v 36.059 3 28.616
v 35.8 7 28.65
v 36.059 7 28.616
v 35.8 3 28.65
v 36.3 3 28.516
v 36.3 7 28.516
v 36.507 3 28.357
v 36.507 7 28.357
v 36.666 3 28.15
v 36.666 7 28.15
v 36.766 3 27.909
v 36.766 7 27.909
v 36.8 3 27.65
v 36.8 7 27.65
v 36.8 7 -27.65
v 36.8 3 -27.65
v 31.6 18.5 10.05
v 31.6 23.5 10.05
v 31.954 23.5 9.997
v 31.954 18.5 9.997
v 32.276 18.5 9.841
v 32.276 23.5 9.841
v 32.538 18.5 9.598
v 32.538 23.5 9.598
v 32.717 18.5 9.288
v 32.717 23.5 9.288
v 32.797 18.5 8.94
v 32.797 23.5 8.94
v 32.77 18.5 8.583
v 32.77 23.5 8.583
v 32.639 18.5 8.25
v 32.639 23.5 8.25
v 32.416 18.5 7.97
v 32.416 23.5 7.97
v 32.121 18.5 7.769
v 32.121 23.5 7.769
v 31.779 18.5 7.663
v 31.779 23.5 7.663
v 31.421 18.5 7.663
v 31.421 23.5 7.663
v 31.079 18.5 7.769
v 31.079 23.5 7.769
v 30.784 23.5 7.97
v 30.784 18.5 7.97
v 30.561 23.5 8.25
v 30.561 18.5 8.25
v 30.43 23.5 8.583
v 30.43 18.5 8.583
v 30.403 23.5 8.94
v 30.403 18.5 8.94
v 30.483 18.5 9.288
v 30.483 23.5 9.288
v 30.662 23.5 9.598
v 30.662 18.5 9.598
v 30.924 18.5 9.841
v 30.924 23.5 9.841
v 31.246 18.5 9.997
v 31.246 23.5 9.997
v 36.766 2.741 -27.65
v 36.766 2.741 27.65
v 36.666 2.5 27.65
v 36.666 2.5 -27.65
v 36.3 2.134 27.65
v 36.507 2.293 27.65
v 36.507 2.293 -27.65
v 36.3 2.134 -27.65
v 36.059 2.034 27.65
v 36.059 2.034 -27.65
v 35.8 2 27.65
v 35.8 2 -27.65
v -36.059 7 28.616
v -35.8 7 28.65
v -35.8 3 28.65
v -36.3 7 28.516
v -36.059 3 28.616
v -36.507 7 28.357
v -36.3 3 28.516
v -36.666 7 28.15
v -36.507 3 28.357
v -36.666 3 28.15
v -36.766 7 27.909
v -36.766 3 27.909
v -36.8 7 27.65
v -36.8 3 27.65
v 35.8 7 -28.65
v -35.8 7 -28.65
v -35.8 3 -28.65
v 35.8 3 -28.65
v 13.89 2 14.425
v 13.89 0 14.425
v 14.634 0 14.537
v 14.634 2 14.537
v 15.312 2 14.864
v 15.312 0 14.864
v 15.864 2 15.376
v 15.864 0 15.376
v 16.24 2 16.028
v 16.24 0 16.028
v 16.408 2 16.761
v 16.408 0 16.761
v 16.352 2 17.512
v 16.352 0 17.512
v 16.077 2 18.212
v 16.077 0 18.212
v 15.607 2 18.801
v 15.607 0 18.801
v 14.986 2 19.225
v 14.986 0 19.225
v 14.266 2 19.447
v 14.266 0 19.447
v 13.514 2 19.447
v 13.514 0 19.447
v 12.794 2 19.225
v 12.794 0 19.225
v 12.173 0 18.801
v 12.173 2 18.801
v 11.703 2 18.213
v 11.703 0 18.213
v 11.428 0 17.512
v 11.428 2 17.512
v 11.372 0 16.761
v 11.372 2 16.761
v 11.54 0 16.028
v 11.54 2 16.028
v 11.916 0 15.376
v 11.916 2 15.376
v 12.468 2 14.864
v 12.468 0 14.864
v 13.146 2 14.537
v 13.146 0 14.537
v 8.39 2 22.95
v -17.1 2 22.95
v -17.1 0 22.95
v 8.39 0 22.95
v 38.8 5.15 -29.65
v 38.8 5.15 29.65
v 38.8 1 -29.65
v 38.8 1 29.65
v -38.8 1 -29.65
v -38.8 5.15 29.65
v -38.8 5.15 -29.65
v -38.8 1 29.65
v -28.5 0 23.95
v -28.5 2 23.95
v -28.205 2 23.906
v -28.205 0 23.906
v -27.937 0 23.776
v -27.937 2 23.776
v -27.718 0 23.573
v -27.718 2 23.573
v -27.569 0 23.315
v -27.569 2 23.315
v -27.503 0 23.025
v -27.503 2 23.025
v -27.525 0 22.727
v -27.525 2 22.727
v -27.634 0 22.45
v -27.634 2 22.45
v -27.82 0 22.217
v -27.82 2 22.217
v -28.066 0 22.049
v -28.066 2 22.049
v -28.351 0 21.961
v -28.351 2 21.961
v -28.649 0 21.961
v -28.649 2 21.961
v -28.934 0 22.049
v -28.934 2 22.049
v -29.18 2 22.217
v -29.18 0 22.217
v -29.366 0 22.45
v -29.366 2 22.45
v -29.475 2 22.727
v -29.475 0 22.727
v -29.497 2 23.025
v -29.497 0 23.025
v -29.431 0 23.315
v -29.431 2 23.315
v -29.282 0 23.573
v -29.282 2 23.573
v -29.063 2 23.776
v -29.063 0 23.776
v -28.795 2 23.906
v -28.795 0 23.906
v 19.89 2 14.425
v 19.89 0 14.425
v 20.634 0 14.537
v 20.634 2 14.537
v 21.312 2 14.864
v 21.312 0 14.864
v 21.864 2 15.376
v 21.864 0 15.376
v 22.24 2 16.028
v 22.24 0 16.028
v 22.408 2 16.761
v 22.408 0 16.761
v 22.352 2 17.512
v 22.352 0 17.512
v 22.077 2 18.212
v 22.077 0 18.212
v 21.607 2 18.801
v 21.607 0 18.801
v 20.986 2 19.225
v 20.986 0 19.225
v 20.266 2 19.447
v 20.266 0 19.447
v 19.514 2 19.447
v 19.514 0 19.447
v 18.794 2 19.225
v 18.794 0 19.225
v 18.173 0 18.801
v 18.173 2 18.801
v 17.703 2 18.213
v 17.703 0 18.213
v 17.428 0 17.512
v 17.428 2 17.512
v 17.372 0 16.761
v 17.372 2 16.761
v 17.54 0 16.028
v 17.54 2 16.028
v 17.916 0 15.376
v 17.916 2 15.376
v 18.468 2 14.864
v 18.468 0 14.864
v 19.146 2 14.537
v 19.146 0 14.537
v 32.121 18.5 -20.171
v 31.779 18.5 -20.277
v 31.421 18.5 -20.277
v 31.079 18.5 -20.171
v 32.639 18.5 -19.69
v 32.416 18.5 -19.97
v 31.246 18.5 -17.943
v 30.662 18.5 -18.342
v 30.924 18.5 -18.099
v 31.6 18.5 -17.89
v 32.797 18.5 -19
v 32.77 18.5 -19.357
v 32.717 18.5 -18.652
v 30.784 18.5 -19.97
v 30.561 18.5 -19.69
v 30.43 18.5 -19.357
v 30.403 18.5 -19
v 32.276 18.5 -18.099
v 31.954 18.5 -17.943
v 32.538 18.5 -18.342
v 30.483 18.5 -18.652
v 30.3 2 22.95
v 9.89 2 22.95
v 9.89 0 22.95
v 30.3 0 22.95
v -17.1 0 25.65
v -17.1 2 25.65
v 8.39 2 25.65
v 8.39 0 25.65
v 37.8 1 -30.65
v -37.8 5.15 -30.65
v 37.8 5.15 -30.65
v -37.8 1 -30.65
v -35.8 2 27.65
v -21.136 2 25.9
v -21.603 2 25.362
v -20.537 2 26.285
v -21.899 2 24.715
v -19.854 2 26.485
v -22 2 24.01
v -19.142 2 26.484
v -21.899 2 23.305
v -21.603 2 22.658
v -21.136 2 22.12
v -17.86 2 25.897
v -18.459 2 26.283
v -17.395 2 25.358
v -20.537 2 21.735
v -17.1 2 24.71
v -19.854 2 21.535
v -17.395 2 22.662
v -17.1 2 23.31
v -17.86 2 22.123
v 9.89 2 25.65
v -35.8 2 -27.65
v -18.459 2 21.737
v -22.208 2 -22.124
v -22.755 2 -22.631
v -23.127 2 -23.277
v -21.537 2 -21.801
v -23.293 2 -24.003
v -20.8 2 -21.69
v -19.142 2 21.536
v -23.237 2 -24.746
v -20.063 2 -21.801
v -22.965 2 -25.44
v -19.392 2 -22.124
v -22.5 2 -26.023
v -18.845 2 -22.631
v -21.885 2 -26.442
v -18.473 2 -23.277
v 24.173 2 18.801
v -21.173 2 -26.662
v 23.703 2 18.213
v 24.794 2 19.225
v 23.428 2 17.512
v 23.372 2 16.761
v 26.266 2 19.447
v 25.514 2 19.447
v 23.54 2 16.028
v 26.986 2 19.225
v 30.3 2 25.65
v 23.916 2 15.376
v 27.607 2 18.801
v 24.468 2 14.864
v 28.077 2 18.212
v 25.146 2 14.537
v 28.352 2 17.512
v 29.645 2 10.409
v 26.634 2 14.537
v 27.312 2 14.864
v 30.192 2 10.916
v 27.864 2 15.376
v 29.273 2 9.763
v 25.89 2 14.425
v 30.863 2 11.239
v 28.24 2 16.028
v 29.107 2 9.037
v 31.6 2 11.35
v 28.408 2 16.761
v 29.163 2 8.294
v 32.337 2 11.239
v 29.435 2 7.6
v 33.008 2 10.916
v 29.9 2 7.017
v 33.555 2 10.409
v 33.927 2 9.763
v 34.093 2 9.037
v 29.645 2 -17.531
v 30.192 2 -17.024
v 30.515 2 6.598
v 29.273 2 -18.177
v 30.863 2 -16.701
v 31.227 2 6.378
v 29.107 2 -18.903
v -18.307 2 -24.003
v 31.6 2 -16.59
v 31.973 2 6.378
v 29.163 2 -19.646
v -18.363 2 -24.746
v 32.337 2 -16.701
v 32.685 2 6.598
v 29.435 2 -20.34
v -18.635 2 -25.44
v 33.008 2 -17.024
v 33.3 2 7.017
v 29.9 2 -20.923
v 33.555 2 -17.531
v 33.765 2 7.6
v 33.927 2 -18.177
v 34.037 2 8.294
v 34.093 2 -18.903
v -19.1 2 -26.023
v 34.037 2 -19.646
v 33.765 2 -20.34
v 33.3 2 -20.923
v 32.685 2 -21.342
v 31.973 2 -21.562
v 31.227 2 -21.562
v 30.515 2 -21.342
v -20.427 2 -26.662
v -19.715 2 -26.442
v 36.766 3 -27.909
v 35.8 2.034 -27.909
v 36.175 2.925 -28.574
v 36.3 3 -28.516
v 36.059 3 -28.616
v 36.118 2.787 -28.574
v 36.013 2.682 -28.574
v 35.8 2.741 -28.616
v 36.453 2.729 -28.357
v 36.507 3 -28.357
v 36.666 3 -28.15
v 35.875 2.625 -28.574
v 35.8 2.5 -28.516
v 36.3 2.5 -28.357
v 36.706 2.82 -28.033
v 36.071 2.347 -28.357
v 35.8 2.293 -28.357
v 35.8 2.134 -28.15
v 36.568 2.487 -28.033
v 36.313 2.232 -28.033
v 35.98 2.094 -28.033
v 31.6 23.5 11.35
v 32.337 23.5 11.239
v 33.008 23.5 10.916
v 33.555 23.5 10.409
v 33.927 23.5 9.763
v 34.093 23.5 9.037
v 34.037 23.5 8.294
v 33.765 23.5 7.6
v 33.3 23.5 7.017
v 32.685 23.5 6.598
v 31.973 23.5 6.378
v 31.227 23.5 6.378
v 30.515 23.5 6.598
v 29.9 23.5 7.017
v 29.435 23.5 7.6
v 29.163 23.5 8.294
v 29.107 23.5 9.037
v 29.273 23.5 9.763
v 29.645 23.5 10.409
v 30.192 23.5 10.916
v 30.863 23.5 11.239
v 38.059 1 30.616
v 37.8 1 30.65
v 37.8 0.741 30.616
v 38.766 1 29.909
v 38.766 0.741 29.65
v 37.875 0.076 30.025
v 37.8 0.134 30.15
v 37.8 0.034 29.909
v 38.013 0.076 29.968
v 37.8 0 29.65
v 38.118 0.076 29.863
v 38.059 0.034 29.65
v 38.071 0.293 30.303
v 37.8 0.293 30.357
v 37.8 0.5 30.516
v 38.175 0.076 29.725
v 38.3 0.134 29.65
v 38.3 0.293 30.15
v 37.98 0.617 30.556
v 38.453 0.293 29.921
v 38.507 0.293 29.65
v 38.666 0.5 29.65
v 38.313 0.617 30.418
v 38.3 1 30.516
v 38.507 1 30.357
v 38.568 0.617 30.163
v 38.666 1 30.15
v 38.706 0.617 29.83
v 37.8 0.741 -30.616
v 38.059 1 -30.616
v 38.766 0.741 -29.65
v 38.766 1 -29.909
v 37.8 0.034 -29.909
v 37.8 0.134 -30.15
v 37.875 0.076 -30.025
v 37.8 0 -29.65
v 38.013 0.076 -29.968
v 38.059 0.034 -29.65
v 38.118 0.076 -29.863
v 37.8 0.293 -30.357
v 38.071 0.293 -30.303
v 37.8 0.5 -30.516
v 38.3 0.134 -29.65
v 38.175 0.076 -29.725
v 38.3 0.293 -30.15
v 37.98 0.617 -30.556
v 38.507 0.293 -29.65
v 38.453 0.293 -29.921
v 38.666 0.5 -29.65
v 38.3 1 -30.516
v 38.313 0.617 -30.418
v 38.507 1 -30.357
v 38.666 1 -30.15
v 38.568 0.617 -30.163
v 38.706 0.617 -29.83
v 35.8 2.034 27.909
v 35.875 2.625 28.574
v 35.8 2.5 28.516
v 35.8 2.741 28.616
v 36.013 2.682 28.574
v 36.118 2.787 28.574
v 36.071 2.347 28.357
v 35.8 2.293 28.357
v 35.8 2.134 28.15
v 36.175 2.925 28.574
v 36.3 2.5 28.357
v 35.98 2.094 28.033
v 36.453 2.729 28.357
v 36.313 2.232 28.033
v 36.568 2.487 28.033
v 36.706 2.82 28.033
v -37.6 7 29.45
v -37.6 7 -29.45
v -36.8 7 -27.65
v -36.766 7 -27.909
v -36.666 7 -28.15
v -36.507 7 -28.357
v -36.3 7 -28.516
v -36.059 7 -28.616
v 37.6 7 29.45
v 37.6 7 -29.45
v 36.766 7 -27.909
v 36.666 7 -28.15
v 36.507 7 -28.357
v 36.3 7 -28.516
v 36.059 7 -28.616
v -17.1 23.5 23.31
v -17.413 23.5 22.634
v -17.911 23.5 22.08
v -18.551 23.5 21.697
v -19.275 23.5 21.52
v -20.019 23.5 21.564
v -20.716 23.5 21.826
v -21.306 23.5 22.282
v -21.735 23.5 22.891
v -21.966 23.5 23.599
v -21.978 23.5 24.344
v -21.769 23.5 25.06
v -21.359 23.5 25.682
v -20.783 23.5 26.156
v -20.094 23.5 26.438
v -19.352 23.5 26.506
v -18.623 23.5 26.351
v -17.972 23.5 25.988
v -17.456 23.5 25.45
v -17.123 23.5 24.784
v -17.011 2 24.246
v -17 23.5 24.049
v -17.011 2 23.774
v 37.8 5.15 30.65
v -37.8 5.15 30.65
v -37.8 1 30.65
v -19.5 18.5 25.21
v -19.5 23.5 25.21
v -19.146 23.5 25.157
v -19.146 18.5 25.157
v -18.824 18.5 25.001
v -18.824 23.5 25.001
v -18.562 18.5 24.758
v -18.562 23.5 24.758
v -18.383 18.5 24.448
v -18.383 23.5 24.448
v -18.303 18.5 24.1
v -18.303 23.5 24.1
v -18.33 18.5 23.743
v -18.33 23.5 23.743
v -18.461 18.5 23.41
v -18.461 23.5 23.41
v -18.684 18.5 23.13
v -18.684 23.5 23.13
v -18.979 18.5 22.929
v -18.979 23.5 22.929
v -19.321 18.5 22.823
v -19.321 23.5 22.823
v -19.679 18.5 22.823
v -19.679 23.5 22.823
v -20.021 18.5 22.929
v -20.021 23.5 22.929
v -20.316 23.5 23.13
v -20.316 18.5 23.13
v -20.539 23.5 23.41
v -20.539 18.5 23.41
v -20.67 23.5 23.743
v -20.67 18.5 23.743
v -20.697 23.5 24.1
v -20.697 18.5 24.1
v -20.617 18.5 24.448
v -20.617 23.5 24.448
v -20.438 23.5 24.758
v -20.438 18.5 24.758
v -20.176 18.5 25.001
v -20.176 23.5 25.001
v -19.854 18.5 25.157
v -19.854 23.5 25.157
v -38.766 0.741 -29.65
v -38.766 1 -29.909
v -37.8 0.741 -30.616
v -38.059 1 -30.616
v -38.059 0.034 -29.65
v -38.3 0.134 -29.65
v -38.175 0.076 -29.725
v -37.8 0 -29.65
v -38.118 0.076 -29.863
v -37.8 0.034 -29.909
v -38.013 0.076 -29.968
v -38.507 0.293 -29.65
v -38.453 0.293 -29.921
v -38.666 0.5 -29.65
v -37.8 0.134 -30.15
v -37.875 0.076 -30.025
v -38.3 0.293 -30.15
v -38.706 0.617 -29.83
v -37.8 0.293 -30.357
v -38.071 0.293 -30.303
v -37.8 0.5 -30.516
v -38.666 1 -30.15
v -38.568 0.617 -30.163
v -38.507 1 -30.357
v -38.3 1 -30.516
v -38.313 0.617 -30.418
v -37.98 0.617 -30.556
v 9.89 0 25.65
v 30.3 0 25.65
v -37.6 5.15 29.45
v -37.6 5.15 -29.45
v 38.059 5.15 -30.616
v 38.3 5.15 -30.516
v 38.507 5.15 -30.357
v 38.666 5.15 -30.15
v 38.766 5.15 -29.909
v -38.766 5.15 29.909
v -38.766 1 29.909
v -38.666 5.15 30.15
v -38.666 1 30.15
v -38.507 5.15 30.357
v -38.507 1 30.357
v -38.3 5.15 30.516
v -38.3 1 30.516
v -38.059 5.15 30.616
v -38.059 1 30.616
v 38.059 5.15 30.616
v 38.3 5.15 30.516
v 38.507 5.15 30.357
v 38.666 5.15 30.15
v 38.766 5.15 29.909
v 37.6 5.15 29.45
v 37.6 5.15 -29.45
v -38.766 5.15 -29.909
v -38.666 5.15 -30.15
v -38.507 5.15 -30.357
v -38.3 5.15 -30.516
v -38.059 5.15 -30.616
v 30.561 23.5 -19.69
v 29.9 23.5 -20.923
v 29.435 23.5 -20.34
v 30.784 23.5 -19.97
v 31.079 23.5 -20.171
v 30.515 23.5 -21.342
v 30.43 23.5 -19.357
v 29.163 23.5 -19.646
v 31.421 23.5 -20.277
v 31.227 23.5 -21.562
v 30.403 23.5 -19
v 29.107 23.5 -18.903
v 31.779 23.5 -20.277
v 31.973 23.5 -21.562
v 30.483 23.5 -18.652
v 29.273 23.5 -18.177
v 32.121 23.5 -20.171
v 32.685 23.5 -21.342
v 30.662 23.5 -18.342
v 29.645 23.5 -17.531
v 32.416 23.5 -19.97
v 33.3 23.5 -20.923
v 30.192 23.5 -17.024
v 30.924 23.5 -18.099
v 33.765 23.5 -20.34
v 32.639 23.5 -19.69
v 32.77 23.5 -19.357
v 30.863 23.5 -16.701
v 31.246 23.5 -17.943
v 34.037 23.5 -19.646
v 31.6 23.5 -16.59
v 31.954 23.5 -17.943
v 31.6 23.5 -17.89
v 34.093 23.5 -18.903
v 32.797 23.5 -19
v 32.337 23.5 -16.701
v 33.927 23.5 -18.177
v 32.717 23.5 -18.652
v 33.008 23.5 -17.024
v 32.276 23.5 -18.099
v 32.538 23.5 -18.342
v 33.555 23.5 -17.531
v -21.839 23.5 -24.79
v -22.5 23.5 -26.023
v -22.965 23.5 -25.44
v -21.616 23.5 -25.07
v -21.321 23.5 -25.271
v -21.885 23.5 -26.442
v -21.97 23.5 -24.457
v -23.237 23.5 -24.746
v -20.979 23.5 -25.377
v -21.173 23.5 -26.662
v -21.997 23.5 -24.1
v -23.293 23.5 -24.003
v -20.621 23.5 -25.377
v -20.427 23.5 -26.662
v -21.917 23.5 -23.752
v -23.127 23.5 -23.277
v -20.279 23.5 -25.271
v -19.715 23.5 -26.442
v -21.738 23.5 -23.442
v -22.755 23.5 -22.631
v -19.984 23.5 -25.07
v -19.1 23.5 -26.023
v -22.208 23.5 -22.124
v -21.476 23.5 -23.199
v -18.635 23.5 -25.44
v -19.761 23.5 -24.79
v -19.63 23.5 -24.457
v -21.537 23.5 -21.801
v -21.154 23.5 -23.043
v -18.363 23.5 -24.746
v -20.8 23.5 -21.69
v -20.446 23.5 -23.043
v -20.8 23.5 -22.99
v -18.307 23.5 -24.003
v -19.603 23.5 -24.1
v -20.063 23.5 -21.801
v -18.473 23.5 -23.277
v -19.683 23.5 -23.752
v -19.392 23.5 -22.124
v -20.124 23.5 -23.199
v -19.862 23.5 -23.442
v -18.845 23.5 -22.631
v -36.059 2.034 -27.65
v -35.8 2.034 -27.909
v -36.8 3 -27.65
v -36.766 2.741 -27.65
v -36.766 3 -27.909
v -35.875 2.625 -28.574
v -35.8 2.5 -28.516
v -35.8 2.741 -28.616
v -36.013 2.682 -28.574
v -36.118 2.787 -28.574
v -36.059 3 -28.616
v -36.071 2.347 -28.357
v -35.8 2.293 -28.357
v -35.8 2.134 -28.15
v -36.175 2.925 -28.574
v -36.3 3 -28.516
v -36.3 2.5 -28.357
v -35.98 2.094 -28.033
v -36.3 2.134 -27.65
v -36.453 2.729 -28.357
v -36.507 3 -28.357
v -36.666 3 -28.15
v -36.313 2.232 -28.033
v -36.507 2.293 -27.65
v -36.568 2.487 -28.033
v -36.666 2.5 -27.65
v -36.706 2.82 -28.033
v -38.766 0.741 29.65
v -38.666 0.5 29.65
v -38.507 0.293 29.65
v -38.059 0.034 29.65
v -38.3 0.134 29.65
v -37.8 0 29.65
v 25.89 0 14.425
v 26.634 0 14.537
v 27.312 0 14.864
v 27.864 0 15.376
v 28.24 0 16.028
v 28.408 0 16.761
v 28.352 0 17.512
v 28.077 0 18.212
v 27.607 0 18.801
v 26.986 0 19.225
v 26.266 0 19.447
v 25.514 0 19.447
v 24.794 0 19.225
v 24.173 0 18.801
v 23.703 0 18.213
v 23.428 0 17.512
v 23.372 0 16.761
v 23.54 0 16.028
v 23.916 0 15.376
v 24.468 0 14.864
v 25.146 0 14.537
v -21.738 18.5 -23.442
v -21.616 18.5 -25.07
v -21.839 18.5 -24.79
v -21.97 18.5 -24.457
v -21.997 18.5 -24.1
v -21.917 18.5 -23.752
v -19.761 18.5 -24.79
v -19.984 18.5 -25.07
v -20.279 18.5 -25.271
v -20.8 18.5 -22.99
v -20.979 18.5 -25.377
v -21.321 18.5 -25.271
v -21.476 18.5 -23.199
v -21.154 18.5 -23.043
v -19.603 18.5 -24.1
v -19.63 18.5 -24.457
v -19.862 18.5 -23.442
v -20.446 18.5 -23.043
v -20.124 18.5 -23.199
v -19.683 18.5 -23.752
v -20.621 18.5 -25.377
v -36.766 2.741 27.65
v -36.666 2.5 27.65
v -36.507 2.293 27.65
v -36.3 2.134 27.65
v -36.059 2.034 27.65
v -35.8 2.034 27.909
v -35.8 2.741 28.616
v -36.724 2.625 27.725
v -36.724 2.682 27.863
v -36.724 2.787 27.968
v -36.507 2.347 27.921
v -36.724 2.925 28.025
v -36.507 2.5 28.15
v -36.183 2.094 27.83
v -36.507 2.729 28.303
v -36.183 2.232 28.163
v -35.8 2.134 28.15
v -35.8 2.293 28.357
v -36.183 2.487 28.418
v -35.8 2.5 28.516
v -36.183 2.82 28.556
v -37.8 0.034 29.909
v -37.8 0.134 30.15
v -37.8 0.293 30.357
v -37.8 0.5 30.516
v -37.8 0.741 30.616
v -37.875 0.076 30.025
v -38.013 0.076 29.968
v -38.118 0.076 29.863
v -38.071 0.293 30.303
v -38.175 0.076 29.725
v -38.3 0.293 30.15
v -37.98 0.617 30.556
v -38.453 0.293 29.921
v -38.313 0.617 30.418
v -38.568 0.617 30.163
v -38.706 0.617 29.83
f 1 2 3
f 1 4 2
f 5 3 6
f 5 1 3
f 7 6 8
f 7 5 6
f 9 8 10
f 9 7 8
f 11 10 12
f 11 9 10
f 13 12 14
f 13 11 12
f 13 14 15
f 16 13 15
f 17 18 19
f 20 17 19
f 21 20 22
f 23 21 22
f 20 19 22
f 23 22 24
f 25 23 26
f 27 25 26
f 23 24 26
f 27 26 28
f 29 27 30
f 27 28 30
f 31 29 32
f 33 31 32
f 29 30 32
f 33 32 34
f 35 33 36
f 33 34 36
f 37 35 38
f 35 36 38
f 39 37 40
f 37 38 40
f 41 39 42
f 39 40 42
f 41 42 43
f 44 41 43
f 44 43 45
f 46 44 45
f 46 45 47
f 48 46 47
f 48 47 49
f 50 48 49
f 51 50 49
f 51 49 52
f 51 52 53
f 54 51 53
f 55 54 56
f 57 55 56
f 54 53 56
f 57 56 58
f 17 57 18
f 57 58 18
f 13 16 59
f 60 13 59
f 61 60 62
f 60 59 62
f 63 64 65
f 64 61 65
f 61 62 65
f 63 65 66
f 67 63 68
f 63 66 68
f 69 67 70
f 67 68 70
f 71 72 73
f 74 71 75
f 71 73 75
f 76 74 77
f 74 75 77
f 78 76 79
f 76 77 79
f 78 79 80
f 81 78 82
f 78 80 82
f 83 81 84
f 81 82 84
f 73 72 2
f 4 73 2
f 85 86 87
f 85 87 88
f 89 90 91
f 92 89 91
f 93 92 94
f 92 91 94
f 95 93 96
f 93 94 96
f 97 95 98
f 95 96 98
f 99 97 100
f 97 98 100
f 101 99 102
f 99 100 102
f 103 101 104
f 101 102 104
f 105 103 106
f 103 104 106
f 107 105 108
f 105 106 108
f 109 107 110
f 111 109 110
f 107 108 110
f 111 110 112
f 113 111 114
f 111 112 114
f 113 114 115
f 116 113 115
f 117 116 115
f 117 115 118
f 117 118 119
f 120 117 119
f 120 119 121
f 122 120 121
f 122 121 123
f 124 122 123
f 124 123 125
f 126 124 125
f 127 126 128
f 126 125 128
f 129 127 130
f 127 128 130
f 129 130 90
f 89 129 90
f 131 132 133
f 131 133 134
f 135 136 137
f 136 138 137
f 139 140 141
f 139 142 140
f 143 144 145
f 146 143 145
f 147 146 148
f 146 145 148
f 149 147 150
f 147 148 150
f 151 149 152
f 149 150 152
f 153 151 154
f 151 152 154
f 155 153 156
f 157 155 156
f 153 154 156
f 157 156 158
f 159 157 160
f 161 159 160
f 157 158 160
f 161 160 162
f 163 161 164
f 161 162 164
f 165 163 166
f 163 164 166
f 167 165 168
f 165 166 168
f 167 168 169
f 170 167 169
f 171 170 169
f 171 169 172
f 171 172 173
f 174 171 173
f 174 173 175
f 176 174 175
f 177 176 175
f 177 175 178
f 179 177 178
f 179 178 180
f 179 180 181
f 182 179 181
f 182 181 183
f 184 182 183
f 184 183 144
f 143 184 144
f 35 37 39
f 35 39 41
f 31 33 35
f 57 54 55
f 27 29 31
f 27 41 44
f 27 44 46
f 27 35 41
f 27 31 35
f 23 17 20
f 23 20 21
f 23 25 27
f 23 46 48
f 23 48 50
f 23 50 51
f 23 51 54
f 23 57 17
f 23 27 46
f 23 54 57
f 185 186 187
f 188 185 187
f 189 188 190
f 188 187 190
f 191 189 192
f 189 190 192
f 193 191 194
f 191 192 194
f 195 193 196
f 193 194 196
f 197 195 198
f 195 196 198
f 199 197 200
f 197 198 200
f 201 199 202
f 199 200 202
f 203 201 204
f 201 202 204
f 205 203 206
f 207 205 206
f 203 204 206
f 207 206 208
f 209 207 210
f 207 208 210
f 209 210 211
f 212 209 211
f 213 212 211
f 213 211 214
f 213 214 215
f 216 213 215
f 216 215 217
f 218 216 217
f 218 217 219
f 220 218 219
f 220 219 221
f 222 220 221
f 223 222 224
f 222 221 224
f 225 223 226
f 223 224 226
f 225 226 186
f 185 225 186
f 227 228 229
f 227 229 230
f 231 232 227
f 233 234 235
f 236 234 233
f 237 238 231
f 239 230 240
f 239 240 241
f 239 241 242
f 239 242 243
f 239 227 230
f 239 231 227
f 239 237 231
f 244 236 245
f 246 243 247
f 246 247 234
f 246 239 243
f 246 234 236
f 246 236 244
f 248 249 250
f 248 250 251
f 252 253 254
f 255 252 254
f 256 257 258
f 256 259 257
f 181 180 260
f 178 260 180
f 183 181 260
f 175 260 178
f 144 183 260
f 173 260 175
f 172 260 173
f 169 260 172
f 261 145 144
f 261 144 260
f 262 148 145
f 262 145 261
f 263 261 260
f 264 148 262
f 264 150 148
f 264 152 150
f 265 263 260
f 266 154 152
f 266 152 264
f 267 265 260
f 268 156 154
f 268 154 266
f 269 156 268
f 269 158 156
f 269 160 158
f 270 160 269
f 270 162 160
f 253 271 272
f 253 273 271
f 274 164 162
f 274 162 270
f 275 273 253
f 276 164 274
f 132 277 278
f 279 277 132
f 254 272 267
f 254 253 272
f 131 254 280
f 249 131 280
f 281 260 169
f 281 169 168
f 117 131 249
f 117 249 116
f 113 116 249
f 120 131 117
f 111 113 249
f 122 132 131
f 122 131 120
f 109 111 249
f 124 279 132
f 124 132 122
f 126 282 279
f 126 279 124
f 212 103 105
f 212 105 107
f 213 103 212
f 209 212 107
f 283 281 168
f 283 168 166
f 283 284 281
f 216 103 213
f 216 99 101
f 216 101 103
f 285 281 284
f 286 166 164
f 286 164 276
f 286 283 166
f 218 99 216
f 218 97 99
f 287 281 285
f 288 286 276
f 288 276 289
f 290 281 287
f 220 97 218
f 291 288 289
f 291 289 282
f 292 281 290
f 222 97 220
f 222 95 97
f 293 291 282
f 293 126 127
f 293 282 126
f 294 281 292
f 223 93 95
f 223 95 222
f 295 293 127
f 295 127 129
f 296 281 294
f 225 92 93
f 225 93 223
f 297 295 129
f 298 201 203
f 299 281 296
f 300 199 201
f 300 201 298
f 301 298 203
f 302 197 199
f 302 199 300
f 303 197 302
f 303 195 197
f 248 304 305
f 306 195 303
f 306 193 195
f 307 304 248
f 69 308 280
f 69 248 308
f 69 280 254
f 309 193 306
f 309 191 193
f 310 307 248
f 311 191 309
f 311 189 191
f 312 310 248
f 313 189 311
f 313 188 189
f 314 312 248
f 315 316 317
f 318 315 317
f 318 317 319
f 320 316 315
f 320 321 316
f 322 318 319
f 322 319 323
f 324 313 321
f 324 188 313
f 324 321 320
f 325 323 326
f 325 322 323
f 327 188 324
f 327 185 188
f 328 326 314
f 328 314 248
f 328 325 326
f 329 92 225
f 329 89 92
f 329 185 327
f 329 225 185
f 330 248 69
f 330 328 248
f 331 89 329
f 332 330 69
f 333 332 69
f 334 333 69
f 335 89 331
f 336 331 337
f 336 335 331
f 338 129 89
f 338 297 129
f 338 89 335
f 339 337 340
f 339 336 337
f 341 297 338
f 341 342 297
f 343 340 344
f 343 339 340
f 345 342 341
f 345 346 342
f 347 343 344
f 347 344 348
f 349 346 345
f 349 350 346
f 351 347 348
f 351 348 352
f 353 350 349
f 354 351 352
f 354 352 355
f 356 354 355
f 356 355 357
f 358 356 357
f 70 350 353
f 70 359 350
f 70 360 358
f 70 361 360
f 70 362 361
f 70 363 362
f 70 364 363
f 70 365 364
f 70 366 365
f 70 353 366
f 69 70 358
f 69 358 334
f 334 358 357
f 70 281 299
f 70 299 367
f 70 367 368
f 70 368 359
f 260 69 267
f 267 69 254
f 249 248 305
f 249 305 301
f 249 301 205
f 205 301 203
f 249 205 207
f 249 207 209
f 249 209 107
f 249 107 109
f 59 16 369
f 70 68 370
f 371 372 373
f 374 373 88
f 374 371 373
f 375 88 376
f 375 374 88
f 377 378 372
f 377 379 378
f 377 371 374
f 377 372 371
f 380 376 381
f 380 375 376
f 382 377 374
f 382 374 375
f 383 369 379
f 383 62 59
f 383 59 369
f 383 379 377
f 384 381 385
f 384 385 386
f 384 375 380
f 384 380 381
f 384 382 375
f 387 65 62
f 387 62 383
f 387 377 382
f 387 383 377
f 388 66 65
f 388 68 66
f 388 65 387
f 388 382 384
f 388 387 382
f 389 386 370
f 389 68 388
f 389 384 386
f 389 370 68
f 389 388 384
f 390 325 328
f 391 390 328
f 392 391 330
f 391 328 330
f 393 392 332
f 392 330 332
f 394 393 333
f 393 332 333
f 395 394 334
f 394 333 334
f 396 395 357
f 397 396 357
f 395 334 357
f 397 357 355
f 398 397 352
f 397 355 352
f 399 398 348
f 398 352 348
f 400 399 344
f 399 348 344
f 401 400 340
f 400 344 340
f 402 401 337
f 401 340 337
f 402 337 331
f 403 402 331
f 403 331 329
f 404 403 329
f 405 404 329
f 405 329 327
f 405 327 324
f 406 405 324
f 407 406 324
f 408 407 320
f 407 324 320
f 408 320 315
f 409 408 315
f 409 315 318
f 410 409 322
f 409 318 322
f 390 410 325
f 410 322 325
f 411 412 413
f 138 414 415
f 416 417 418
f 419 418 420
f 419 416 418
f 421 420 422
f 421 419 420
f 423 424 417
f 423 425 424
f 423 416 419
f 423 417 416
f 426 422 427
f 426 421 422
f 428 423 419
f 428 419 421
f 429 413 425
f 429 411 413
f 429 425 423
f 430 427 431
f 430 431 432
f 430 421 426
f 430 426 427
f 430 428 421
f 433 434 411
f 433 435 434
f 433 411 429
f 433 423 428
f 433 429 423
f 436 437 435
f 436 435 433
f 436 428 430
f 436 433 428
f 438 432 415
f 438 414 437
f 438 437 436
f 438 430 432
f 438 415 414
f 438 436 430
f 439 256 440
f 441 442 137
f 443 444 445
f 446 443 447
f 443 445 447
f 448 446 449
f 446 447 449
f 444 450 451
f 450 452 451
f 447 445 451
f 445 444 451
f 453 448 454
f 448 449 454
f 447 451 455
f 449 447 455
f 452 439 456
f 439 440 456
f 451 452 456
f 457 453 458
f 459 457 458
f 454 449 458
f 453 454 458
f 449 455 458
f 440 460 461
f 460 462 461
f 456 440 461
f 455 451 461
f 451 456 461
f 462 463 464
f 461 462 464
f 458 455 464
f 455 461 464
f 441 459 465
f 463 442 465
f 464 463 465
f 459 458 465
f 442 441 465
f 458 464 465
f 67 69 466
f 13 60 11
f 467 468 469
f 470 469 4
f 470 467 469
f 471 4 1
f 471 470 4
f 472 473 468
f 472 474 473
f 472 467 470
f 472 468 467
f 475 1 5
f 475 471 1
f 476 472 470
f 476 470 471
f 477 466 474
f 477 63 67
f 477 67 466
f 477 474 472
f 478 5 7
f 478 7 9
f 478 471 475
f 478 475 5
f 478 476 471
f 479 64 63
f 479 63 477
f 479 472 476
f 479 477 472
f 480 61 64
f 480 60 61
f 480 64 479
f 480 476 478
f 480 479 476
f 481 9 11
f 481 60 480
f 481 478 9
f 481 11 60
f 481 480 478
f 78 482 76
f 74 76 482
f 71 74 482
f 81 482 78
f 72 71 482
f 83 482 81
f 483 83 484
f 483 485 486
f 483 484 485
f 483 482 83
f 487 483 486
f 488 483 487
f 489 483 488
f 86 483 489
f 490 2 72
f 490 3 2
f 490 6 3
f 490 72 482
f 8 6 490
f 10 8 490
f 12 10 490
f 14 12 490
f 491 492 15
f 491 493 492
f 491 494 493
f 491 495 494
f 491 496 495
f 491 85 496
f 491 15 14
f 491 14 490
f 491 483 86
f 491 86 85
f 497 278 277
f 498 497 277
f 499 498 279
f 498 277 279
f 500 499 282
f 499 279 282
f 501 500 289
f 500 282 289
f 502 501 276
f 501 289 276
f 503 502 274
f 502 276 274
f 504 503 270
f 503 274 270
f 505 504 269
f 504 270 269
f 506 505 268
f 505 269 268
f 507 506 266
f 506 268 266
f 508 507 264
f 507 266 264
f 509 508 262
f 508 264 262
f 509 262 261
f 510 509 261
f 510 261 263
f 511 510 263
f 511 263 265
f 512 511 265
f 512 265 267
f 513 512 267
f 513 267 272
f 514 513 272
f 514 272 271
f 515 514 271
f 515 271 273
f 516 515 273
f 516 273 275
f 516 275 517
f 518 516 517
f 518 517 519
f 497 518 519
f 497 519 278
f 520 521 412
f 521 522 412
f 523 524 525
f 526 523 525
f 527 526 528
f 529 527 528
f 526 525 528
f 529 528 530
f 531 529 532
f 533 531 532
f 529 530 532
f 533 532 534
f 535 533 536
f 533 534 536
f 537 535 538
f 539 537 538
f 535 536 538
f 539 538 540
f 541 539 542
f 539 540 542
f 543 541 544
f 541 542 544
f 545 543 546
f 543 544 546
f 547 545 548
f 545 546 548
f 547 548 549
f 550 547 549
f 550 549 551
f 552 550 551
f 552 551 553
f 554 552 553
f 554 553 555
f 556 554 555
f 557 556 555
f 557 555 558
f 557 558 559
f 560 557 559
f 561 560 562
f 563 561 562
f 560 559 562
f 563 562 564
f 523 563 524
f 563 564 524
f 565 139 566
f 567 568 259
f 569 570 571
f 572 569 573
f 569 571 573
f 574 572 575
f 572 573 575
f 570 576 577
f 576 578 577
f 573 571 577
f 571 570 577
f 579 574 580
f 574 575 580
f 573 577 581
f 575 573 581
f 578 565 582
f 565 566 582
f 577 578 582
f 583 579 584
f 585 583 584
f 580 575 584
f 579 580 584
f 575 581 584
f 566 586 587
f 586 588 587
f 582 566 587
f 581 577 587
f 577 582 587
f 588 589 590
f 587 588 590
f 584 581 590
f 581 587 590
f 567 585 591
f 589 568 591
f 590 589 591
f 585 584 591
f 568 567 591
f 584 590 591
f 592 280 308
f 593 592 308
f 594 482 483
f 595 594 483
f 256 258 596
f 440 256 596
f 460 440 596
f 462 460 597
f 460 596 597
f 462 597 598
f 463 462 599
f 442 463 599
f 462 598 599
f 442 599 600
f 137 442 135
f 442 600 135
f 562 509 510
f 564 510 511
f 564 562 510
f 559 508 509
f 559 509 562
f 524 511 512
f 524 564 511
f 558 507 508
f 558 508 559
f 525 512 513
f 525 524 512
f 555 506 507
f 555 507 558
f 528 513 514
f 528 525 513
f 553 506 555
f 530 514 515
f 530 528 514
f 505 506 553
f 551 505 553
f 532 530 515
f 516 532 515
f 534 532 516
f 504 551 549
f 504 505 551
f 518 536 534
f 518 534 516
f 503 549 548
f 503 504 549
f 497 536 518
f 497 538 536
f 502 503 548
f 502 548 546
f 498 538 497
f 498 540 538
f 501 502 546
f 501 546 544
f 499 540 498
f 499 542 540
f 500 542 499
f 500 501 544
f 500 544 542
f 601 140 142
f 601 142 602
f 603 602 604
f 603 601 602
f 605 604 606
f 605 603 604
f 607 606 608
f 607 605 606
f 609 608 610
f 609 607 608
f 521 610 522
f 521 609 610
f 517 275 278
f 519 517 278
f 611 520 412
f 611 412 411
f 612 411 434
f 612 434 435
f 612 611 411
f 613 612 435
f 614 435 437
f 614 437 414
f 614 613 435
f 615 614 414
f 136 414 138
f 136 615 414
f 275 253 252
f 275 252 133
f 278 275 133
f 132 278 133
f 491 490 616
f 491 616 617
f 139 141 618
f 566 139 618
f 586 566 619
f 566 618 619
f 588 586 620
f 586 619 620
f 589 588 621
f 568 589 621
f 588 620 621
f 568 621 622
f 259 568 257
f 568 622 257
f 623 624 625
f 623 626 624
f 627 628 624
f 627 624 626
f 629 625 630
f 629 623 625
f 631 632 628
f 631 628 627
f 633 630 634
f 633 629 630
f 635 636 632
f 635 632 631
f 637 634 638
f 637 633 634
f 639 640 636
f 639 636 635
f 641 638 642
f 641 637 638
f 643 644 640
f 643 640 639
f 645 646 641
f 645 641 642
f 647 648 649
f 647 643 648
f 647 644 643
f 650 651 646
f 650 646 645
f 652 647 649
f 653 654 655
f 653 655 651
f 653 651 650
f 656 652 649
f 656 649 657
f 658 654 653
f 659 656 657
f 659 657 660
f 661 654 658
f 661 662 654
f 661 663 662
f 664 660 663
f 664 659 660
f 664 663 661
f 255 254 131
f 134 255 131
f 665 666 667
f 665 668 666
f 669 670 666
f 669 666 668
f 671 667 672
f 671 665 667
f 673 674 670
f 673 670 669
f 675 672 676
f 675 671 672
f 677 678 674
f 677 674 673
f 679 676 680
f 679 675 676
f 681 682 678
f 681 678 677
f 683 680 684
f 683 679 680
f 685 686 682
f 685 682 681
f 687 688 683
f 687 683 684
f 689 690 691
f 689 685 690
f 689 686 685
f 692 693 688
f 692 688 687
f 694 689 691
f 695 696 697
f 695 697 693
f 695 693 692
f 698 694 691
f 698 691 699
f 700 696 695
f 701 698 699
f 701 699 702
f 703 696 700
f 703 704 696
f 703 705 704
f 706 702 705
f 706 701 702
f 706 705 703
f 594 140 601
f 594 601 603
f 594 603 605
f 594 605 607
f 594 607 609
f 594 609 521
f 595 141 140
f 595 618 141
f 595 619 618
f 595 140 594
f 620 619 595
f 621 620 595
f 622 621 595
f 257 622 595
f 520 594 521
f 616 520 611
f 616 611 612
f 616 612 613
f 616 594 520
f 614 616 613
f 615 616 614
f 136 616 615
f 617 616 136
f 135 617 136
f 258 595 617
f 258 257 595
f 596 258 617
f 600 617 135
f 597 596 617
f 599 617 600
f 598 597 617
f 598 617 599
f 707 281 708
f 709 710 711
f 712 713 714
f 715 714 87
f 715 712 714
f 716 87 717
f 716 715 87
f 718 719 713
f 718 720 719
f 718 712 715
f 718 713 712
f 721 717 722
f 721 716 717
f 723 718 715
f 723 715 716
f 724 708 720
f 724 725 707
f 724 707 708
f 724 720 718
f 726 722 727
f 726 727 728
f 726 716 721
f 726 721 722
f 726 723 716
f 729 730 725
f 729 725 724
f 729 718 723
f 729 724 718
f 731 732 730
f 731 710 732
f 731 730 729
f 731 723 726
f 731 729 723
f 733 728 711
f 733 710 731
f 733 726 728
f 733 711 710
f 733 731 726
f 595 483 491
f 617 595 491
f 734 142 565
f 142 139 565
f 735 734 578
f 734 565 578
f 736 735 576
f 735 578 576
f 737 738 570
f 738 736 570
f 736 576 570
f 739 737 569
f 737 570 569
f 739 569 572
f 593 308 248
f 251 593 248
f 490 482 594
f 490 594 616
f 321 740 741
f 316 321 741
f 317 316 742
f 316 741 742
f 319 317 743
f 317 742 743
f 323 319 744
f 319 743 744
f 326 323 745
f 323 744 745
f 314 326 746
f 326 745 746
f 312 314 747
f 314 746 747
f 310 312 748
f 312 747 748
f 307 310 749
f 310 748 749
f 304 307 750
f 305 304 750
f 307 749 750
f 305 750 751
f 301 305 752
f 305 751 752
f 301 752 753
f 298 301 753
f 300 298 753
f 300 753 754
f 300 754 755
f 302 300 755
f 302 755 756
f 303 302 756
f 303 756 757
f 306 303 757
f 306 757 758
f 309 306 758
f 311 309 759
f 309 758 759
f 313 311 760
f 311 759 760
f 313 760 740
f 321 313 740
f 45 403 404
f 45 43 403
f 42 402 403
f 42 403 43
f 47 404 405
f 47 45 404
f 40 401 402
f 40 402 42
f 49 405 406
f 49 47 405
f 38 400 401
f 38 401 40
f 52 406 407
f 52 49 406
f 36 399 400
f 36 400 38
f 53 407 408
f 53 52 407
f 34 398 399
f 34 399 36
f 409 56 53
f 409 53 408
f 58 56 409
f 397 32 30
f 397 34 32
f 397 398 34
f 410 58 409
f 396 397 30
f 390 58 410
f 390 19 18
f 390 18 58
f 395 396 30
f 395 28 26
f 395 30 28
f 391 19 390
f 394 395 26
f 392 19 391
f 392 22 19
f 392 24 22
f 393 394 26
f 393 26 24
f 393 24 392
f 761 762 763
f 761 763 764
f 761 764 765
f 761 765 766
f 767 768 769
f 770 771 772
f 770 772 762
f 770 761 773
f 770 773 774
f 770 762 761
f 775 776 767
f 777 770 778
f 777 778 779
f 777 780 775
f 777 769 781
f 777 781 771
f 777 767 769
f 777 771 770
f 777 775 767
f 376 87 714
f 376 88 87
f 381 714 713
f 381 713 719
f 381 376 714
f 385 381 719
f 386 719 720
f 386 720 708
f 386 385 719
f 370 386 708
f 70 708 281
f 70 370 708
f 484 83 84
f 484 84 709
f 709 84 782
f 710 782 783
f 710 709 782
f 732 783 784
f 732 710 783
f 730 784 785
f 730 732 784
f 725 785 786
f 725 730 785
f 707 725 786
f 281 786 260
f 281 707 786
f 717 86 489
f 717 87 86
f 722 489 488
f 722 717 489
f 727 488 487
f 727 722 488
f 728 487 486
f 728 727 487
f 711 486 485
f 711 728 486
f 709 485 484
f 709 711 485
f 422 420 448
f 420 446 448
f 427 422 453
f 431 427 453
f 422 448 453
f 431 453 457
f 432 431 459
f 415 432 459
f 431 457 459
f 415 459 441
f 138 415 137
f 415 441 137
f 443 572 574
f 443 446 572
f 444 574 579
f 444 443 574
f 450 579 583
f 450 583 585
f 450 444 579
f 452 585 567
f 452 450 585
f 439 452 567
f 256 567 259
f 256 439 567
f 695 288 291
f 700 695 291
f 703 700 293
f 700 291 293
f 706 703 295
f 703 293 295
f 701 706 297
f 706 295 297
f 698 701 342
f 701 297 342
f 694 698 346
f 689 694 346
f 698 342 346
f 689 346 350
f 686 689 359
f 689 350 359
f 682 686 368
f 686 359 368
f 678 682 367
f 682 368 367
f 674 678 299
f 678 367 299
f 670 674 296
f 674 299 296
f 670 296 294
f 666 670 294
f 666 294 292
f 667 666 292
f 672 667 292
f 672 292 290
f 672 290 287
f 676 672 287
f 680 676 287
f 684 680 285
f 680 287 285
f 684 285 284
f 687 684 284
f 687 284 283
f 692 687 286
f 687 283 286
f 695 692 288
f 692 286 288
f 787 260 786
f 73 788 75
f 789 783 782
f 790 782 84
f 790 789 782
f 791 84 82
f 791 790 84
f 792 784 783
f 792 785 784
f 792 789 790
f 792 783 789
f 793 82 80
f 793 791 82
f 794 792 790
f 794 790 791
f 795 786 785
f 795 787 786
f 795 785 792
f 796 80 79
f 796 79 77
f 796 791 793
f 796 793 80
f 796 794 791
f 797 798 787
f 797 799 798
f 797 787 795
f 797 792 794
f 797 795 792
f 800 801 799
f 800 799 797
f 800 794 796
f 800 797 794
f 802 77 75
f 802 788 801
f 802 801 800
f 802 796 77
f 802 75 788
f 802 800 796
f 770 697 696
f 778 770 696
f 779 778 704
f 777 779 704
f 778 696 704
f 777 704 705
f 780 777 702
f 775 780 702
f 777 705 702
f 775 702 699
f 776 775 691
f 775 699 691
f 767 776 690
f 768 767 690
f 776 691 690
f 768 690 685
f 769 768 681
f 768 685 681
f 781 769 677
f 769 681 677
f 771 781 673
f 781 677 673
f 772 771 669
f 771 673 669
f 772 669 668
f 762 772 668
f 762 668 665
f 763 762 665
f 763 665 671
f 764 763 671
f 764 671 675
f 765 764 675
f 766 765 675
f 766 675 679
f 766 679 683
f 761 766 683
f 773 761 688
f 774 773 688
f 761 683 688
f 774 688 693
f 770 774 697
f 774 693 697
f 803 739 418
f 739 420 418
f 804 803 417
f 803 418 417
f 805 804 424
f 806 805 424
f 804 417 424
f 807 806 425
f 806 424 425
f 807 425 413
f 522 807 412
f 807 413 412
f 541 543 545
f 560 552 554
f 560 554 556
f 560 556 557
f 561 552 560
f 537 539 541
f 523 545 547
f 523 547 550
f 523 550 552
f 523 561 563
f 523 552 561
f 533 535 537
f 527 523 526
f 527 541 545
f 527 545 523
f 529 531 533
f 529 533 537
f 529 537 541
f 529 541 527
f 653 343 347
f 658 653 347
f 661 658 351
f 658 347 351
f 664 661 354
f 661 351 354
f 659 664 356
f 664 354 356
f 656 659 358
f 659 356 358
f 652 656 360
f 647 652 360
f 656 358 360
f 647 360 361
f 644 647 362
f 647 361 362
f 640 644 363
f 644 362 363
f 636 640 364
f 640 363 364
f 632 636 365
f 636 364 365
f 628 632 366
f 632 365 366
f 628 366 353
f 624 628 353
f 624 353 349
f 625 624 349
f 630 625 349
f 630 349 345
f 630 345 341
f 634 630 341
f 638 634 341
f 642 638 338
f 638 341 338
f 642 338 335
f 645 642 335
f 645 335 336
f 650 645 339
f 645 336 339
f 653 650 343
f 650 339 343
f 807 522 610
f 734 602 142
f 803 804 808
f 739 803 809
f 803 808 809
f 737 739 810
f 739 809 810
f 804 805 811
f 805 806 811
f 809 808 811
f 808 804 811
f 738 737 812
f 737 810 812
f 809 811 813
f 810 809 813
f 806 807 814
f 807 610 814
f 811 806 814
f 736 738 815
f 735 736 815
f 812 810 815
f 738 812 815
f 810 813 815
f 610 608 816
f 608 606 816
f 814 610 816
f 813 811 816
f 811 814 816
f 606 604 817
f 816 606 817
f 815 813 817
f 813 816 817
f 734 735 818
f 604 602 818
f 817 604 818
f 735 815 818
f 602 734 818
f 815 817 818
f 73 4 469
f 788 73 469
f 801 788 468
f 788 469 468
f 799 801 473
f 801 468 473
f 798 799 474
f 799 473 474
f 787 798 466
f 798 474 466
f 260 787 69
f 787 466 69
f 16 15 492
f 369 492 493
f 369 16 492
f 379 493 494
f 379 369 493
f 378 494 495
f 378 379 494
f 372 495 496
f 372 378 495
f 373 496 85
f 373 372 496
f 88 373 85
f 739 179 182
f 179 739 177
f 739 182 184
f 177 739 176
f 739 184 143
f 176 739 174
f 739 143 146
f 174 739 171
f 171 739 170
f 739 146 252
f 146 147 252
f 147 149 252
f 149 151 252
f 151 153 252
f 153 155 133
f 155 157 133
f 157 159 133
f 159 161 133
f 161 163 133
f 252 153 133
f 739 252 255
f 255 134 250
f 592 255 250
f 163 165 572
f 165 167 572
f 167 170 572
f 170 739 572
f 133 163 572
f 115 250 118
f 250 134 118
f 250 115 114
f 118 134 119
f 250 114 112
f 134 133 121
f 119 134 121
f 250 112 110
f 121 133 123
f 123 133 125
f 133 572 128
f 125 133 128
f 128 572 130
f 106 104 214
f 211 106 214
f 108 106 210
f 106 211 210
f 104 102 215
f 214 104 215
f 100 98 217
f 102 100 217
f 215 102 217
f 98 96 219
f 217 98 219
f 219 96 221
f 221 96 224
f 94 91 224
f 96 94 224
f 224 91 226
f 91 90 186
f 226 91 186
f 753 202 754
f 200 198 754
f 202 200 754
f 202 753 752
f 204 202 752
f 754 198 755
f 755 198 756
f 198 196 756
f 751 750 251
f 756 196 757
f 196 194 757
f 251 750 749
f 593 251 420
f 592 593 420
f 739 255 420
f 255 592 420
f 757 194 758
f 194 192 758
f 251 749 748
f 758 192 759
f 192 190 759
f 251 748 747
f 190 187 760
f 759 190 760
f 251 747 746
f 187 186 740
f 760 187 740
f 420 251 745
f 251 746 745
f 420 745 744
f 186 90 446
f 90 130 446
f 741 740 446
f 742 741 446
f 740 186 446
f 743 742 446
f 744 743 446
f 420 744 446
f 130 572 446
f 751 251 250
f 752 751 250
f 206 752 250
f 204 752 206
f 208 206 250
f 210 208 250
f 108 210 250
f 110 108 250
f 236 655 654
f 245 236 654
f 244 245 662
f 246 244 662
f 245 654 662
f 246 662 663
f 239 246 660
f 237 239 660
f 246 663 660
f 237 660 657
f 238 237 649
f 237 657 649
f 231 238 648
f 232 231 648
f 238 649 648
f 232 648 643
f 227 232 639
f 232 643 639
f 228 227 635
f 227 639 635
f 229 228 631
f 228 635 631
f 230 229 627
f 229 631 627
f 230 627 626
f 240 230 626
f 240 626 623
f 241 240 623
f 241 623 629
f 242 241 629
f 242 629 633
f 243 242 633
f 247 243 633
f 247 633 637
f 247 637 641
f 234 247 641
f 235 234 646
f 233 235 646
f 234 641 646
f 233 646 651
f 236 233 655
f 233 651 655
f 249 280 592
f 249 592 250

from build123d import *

# Parameters (mm, degrees)
SKETCH1_W               = 77.6
SKETCH1_H               = 61.3
BOSS_EXTRUDE1_DEPTH     = 7
SKETCH2_W               = 95.2
SKETCH2_H               = 78.9
SKETCH2_W_2             = 75.2
SKETCH2_H_2             = 58.9
CUT_EXTRUDE_THIN1_DEPTH = 1.85
SKETCH3_W               = 73.6
SKETCH3_H               = 57.3
CUT_EXTRUDE1_DEPTH      = 5
FILLET1_R               = 1
CUT_EXTRUDE3_REACH      = 51.698
SKETCH5_W               = 20.41
SKETCH5_H               = 2.7
SKETCH5_W_2             = 25.49
SKETCH6_R               = 2.5
BOSS_EXTRUDE2_DEPTH     = 21.5
SKETCH7_R               = 1.2
CUT_EXTRUDE4_DEPTH      = 5
CUT_EXTRUDE5_REACH      = 55.918
SKETCH8_R               = 1
SKETCH10_R              = 2.525
CUT_EXTRUDE6_DEPTH      = 2


with BuildPart() as part:
    # Sketch1 → Boss-Extrude1 (new body)
    with BuildSketch(Plane(origin=(0, 0, 0), x_dir=(1, 0, 0), z_dir=(0, 1, 0))):
        Rectangle(SKETCH1_W, SKETCH1_H)
    extrude(amount=BOSS_EXTRUDE1_DEPTH)

    # Sketch2 → Cut-Extrude-Thin1 (cut)
    with BuildSketch(Plane(origin=(0, 7, 0), x_dir=(1, 0, 0), z_dir=(0, 1, 0))):
        Rectangle(SKETCH2_W, SKETCH2_H)
        Rectangle(SKETCH2_W_2, SKETCH2_H_2, mode=Mode.SUBTRACT)
    extrude(amount=-CUT_EXTRUDE_THIN1_DEPTH, mode=Mode.SUBTRACT)

    # Sketch3 → Cut-Extrude1 (cut)
    with BuildSketch(Plane(origin=(0, 7, 0), x_dir=(1, 0, 0), z_dir=(0, 1, 0))):
        Rectangle(SKETCH3_W, SKETCH3_H)
    extrude(amount=-CUT_EXTRUDE1_DEPTH, mode=Mode.SUBTRACT)

    # Fillet1
    fillet1_edges = [part.edges().sort_by_distance(p)[0] for p in [
        (38.8, 2.575, 30.65),
        (-38.8, 2.575, 30.65),
        (-38.8, 2.575, -30.65),
        (38.8, 2.575, -30.65),
        (36.8, 2, 0),
        (36.8, 4.5, -28.65),
        (0, 2, 28.65),
        (36.8, 4.5, 28.65),
        (-36.8, 2, 0),
        (-36.8, 4.5, 28.65),
        (0, 2, -28.65),
        (-36.8, 4.5, -28.65),
        (0, 0, 30.65),
        (-38.8, 0, 0),
        (0, 0, -30.65),
        (38.8, 0, 0),
    ]]
    fillet(fillet1_edges, radius=FILLET1_R)

    # Sketch5 → Cut-Extrude3 (cut, up to next)
    with BuildSketch(Plane(origin=(0, 2, 0), x_dir=(1, 0, 0), z_dir=(0, 1, 0)), mode=Mode.PRIVATE) as cut_extrude3_sk1:
        with Locations((20.095, -24.3)):
            Rectangle(SKETCH5_W, SKETCH5_H)
    cut_extrude3_tool1 = extrude(cut_extrude3_sk1.sketch, amount=-CUT_EXTRUDE3_REACH, mode=Mode.PRIVATE) & part.part
    # Sketch5 → Cut-Extrude3 (cut, up to next)
    with BuildSketch(Plane(origin=(0, 2, 0), x_dir=(1, 0, 0), z_dir=(0, 1, 0)), mode=Mode.PRIVATE) as cut_extrude3_sk2:
        with Locations((-4.355, -24.3)):
            Rectangle(SKETCH5_W_2, SKETCH5_H)
    cut_extrude3_tool2 = extrude(cut_extrude3_sk2.sketch, amount=-CUT_EXTRUDE3_REACH, mode=Mode.PRIVATE) & part.part
    add(cut_extrude3_tool1.solids().sort_by_distance((20.095, 2, 24.3))[0], mode=Mode.SUBTRACT)
    add(cut_extrude3_tool2.solids().sort_by_distance((-4.355, 2, 24.3))[0], mode=Mode.SUBTRACT)

    # Sketch6 → Boss-Extrude2 (add)
    with BuildSketch(Plane(origin=(0, 2, 0), x_dir=(1, 0, 0), z_dir=(0, 1, 0))):
        with Locations(Location((31.6, 19.09, 0), (0, 0, 270))):
            Circle(SKETCH6_R)
        with Locations(Location((31.6, -8.85, 0), (0, 0, 270))):
            Circle(SKETCH6_R)
        with Locations(Location((-19.5, -24.01, 0), (0, 0, 16.260204708))):
            Circle(SKETCH6_R)
        with Locations(Location((-20.8, 24.19, 0), (0, 0, 270))):
            Circle(SKETCH6_R)
    extrude(amount=BOSS_EXTRUDE2_DEPTH)

    # Sketch7 → Cut-Extrude4 (cut)
    with BuildSketch(Plane(origin=(0, 23.5, 0), x_dir=(1, 0, 0), z_dir=(0, 1, 0))):
        with Locations(Location((31.6, 19.09, 0), (0, 0, 270))):
            Circle(SKETCH7_R)
        with Locations(Location((31.6, -8.85, 0), (0, 0, 270))):
            Circle(SKETCH7_R)
        with Locations(Location((-20.8, 24.19, 0), (0, 0, 270))):
            Circle(SKETCH7_R)
        with Locations(Location((-19.5, -24.01, 0), (0, 0, 270))):
            Circle(SKETCH7_R)
    extrude(amount=-CUT_EXTRUDE4_DEPTH, mode=Mode.SUBTRACT)

    # Sketch8 → Cut-Extrude5 (cut, up to next)
    with BuildSketch(Plane(origin=(0, 2, 0), x_dir=(1, 0, 0), z_dir=(0, 1, 0)), mode=Mode.PRIVATE) as cut_extrude5_sk1:
        with Locations(Location((-28.5, -22.95, 0), (0, 0, 270))):
            Circle(SKETCH8_R)
    cut_extrude5_tool1 = extrude(cut_extrude5_sk1.sketch, amount=-CUT_EXTRUDE5_REACH, mode=Mode.PRIVATE) & part.part
    add(cut_extrude5_tool1.solids().sort_by_distance((-28.5, 2, 22.95))[0], mode=Mode.SUBTRACT)

    # Sketch10 → Cut-Extrude6 (cut)
    with BuildSketch(Plane.XZ):
        with Locations(Location((13.89, 16.95, 0), (0, 0, 270))):
            Circle(SKETCH10_R)
        with Locations(Location((19.89, 16.95, 0), (0, 0, 270))):
            Circle(SKETCH10_R)
        with Locations(Location((25.89, 16.95, 0), (0, 0, 270))):
            Circle(SKETCH10_R)
    extrude(amount=-CUT_EXTRUDE6_DEPTH, mode=Mode.SUBTRACT)


solid = part.part
